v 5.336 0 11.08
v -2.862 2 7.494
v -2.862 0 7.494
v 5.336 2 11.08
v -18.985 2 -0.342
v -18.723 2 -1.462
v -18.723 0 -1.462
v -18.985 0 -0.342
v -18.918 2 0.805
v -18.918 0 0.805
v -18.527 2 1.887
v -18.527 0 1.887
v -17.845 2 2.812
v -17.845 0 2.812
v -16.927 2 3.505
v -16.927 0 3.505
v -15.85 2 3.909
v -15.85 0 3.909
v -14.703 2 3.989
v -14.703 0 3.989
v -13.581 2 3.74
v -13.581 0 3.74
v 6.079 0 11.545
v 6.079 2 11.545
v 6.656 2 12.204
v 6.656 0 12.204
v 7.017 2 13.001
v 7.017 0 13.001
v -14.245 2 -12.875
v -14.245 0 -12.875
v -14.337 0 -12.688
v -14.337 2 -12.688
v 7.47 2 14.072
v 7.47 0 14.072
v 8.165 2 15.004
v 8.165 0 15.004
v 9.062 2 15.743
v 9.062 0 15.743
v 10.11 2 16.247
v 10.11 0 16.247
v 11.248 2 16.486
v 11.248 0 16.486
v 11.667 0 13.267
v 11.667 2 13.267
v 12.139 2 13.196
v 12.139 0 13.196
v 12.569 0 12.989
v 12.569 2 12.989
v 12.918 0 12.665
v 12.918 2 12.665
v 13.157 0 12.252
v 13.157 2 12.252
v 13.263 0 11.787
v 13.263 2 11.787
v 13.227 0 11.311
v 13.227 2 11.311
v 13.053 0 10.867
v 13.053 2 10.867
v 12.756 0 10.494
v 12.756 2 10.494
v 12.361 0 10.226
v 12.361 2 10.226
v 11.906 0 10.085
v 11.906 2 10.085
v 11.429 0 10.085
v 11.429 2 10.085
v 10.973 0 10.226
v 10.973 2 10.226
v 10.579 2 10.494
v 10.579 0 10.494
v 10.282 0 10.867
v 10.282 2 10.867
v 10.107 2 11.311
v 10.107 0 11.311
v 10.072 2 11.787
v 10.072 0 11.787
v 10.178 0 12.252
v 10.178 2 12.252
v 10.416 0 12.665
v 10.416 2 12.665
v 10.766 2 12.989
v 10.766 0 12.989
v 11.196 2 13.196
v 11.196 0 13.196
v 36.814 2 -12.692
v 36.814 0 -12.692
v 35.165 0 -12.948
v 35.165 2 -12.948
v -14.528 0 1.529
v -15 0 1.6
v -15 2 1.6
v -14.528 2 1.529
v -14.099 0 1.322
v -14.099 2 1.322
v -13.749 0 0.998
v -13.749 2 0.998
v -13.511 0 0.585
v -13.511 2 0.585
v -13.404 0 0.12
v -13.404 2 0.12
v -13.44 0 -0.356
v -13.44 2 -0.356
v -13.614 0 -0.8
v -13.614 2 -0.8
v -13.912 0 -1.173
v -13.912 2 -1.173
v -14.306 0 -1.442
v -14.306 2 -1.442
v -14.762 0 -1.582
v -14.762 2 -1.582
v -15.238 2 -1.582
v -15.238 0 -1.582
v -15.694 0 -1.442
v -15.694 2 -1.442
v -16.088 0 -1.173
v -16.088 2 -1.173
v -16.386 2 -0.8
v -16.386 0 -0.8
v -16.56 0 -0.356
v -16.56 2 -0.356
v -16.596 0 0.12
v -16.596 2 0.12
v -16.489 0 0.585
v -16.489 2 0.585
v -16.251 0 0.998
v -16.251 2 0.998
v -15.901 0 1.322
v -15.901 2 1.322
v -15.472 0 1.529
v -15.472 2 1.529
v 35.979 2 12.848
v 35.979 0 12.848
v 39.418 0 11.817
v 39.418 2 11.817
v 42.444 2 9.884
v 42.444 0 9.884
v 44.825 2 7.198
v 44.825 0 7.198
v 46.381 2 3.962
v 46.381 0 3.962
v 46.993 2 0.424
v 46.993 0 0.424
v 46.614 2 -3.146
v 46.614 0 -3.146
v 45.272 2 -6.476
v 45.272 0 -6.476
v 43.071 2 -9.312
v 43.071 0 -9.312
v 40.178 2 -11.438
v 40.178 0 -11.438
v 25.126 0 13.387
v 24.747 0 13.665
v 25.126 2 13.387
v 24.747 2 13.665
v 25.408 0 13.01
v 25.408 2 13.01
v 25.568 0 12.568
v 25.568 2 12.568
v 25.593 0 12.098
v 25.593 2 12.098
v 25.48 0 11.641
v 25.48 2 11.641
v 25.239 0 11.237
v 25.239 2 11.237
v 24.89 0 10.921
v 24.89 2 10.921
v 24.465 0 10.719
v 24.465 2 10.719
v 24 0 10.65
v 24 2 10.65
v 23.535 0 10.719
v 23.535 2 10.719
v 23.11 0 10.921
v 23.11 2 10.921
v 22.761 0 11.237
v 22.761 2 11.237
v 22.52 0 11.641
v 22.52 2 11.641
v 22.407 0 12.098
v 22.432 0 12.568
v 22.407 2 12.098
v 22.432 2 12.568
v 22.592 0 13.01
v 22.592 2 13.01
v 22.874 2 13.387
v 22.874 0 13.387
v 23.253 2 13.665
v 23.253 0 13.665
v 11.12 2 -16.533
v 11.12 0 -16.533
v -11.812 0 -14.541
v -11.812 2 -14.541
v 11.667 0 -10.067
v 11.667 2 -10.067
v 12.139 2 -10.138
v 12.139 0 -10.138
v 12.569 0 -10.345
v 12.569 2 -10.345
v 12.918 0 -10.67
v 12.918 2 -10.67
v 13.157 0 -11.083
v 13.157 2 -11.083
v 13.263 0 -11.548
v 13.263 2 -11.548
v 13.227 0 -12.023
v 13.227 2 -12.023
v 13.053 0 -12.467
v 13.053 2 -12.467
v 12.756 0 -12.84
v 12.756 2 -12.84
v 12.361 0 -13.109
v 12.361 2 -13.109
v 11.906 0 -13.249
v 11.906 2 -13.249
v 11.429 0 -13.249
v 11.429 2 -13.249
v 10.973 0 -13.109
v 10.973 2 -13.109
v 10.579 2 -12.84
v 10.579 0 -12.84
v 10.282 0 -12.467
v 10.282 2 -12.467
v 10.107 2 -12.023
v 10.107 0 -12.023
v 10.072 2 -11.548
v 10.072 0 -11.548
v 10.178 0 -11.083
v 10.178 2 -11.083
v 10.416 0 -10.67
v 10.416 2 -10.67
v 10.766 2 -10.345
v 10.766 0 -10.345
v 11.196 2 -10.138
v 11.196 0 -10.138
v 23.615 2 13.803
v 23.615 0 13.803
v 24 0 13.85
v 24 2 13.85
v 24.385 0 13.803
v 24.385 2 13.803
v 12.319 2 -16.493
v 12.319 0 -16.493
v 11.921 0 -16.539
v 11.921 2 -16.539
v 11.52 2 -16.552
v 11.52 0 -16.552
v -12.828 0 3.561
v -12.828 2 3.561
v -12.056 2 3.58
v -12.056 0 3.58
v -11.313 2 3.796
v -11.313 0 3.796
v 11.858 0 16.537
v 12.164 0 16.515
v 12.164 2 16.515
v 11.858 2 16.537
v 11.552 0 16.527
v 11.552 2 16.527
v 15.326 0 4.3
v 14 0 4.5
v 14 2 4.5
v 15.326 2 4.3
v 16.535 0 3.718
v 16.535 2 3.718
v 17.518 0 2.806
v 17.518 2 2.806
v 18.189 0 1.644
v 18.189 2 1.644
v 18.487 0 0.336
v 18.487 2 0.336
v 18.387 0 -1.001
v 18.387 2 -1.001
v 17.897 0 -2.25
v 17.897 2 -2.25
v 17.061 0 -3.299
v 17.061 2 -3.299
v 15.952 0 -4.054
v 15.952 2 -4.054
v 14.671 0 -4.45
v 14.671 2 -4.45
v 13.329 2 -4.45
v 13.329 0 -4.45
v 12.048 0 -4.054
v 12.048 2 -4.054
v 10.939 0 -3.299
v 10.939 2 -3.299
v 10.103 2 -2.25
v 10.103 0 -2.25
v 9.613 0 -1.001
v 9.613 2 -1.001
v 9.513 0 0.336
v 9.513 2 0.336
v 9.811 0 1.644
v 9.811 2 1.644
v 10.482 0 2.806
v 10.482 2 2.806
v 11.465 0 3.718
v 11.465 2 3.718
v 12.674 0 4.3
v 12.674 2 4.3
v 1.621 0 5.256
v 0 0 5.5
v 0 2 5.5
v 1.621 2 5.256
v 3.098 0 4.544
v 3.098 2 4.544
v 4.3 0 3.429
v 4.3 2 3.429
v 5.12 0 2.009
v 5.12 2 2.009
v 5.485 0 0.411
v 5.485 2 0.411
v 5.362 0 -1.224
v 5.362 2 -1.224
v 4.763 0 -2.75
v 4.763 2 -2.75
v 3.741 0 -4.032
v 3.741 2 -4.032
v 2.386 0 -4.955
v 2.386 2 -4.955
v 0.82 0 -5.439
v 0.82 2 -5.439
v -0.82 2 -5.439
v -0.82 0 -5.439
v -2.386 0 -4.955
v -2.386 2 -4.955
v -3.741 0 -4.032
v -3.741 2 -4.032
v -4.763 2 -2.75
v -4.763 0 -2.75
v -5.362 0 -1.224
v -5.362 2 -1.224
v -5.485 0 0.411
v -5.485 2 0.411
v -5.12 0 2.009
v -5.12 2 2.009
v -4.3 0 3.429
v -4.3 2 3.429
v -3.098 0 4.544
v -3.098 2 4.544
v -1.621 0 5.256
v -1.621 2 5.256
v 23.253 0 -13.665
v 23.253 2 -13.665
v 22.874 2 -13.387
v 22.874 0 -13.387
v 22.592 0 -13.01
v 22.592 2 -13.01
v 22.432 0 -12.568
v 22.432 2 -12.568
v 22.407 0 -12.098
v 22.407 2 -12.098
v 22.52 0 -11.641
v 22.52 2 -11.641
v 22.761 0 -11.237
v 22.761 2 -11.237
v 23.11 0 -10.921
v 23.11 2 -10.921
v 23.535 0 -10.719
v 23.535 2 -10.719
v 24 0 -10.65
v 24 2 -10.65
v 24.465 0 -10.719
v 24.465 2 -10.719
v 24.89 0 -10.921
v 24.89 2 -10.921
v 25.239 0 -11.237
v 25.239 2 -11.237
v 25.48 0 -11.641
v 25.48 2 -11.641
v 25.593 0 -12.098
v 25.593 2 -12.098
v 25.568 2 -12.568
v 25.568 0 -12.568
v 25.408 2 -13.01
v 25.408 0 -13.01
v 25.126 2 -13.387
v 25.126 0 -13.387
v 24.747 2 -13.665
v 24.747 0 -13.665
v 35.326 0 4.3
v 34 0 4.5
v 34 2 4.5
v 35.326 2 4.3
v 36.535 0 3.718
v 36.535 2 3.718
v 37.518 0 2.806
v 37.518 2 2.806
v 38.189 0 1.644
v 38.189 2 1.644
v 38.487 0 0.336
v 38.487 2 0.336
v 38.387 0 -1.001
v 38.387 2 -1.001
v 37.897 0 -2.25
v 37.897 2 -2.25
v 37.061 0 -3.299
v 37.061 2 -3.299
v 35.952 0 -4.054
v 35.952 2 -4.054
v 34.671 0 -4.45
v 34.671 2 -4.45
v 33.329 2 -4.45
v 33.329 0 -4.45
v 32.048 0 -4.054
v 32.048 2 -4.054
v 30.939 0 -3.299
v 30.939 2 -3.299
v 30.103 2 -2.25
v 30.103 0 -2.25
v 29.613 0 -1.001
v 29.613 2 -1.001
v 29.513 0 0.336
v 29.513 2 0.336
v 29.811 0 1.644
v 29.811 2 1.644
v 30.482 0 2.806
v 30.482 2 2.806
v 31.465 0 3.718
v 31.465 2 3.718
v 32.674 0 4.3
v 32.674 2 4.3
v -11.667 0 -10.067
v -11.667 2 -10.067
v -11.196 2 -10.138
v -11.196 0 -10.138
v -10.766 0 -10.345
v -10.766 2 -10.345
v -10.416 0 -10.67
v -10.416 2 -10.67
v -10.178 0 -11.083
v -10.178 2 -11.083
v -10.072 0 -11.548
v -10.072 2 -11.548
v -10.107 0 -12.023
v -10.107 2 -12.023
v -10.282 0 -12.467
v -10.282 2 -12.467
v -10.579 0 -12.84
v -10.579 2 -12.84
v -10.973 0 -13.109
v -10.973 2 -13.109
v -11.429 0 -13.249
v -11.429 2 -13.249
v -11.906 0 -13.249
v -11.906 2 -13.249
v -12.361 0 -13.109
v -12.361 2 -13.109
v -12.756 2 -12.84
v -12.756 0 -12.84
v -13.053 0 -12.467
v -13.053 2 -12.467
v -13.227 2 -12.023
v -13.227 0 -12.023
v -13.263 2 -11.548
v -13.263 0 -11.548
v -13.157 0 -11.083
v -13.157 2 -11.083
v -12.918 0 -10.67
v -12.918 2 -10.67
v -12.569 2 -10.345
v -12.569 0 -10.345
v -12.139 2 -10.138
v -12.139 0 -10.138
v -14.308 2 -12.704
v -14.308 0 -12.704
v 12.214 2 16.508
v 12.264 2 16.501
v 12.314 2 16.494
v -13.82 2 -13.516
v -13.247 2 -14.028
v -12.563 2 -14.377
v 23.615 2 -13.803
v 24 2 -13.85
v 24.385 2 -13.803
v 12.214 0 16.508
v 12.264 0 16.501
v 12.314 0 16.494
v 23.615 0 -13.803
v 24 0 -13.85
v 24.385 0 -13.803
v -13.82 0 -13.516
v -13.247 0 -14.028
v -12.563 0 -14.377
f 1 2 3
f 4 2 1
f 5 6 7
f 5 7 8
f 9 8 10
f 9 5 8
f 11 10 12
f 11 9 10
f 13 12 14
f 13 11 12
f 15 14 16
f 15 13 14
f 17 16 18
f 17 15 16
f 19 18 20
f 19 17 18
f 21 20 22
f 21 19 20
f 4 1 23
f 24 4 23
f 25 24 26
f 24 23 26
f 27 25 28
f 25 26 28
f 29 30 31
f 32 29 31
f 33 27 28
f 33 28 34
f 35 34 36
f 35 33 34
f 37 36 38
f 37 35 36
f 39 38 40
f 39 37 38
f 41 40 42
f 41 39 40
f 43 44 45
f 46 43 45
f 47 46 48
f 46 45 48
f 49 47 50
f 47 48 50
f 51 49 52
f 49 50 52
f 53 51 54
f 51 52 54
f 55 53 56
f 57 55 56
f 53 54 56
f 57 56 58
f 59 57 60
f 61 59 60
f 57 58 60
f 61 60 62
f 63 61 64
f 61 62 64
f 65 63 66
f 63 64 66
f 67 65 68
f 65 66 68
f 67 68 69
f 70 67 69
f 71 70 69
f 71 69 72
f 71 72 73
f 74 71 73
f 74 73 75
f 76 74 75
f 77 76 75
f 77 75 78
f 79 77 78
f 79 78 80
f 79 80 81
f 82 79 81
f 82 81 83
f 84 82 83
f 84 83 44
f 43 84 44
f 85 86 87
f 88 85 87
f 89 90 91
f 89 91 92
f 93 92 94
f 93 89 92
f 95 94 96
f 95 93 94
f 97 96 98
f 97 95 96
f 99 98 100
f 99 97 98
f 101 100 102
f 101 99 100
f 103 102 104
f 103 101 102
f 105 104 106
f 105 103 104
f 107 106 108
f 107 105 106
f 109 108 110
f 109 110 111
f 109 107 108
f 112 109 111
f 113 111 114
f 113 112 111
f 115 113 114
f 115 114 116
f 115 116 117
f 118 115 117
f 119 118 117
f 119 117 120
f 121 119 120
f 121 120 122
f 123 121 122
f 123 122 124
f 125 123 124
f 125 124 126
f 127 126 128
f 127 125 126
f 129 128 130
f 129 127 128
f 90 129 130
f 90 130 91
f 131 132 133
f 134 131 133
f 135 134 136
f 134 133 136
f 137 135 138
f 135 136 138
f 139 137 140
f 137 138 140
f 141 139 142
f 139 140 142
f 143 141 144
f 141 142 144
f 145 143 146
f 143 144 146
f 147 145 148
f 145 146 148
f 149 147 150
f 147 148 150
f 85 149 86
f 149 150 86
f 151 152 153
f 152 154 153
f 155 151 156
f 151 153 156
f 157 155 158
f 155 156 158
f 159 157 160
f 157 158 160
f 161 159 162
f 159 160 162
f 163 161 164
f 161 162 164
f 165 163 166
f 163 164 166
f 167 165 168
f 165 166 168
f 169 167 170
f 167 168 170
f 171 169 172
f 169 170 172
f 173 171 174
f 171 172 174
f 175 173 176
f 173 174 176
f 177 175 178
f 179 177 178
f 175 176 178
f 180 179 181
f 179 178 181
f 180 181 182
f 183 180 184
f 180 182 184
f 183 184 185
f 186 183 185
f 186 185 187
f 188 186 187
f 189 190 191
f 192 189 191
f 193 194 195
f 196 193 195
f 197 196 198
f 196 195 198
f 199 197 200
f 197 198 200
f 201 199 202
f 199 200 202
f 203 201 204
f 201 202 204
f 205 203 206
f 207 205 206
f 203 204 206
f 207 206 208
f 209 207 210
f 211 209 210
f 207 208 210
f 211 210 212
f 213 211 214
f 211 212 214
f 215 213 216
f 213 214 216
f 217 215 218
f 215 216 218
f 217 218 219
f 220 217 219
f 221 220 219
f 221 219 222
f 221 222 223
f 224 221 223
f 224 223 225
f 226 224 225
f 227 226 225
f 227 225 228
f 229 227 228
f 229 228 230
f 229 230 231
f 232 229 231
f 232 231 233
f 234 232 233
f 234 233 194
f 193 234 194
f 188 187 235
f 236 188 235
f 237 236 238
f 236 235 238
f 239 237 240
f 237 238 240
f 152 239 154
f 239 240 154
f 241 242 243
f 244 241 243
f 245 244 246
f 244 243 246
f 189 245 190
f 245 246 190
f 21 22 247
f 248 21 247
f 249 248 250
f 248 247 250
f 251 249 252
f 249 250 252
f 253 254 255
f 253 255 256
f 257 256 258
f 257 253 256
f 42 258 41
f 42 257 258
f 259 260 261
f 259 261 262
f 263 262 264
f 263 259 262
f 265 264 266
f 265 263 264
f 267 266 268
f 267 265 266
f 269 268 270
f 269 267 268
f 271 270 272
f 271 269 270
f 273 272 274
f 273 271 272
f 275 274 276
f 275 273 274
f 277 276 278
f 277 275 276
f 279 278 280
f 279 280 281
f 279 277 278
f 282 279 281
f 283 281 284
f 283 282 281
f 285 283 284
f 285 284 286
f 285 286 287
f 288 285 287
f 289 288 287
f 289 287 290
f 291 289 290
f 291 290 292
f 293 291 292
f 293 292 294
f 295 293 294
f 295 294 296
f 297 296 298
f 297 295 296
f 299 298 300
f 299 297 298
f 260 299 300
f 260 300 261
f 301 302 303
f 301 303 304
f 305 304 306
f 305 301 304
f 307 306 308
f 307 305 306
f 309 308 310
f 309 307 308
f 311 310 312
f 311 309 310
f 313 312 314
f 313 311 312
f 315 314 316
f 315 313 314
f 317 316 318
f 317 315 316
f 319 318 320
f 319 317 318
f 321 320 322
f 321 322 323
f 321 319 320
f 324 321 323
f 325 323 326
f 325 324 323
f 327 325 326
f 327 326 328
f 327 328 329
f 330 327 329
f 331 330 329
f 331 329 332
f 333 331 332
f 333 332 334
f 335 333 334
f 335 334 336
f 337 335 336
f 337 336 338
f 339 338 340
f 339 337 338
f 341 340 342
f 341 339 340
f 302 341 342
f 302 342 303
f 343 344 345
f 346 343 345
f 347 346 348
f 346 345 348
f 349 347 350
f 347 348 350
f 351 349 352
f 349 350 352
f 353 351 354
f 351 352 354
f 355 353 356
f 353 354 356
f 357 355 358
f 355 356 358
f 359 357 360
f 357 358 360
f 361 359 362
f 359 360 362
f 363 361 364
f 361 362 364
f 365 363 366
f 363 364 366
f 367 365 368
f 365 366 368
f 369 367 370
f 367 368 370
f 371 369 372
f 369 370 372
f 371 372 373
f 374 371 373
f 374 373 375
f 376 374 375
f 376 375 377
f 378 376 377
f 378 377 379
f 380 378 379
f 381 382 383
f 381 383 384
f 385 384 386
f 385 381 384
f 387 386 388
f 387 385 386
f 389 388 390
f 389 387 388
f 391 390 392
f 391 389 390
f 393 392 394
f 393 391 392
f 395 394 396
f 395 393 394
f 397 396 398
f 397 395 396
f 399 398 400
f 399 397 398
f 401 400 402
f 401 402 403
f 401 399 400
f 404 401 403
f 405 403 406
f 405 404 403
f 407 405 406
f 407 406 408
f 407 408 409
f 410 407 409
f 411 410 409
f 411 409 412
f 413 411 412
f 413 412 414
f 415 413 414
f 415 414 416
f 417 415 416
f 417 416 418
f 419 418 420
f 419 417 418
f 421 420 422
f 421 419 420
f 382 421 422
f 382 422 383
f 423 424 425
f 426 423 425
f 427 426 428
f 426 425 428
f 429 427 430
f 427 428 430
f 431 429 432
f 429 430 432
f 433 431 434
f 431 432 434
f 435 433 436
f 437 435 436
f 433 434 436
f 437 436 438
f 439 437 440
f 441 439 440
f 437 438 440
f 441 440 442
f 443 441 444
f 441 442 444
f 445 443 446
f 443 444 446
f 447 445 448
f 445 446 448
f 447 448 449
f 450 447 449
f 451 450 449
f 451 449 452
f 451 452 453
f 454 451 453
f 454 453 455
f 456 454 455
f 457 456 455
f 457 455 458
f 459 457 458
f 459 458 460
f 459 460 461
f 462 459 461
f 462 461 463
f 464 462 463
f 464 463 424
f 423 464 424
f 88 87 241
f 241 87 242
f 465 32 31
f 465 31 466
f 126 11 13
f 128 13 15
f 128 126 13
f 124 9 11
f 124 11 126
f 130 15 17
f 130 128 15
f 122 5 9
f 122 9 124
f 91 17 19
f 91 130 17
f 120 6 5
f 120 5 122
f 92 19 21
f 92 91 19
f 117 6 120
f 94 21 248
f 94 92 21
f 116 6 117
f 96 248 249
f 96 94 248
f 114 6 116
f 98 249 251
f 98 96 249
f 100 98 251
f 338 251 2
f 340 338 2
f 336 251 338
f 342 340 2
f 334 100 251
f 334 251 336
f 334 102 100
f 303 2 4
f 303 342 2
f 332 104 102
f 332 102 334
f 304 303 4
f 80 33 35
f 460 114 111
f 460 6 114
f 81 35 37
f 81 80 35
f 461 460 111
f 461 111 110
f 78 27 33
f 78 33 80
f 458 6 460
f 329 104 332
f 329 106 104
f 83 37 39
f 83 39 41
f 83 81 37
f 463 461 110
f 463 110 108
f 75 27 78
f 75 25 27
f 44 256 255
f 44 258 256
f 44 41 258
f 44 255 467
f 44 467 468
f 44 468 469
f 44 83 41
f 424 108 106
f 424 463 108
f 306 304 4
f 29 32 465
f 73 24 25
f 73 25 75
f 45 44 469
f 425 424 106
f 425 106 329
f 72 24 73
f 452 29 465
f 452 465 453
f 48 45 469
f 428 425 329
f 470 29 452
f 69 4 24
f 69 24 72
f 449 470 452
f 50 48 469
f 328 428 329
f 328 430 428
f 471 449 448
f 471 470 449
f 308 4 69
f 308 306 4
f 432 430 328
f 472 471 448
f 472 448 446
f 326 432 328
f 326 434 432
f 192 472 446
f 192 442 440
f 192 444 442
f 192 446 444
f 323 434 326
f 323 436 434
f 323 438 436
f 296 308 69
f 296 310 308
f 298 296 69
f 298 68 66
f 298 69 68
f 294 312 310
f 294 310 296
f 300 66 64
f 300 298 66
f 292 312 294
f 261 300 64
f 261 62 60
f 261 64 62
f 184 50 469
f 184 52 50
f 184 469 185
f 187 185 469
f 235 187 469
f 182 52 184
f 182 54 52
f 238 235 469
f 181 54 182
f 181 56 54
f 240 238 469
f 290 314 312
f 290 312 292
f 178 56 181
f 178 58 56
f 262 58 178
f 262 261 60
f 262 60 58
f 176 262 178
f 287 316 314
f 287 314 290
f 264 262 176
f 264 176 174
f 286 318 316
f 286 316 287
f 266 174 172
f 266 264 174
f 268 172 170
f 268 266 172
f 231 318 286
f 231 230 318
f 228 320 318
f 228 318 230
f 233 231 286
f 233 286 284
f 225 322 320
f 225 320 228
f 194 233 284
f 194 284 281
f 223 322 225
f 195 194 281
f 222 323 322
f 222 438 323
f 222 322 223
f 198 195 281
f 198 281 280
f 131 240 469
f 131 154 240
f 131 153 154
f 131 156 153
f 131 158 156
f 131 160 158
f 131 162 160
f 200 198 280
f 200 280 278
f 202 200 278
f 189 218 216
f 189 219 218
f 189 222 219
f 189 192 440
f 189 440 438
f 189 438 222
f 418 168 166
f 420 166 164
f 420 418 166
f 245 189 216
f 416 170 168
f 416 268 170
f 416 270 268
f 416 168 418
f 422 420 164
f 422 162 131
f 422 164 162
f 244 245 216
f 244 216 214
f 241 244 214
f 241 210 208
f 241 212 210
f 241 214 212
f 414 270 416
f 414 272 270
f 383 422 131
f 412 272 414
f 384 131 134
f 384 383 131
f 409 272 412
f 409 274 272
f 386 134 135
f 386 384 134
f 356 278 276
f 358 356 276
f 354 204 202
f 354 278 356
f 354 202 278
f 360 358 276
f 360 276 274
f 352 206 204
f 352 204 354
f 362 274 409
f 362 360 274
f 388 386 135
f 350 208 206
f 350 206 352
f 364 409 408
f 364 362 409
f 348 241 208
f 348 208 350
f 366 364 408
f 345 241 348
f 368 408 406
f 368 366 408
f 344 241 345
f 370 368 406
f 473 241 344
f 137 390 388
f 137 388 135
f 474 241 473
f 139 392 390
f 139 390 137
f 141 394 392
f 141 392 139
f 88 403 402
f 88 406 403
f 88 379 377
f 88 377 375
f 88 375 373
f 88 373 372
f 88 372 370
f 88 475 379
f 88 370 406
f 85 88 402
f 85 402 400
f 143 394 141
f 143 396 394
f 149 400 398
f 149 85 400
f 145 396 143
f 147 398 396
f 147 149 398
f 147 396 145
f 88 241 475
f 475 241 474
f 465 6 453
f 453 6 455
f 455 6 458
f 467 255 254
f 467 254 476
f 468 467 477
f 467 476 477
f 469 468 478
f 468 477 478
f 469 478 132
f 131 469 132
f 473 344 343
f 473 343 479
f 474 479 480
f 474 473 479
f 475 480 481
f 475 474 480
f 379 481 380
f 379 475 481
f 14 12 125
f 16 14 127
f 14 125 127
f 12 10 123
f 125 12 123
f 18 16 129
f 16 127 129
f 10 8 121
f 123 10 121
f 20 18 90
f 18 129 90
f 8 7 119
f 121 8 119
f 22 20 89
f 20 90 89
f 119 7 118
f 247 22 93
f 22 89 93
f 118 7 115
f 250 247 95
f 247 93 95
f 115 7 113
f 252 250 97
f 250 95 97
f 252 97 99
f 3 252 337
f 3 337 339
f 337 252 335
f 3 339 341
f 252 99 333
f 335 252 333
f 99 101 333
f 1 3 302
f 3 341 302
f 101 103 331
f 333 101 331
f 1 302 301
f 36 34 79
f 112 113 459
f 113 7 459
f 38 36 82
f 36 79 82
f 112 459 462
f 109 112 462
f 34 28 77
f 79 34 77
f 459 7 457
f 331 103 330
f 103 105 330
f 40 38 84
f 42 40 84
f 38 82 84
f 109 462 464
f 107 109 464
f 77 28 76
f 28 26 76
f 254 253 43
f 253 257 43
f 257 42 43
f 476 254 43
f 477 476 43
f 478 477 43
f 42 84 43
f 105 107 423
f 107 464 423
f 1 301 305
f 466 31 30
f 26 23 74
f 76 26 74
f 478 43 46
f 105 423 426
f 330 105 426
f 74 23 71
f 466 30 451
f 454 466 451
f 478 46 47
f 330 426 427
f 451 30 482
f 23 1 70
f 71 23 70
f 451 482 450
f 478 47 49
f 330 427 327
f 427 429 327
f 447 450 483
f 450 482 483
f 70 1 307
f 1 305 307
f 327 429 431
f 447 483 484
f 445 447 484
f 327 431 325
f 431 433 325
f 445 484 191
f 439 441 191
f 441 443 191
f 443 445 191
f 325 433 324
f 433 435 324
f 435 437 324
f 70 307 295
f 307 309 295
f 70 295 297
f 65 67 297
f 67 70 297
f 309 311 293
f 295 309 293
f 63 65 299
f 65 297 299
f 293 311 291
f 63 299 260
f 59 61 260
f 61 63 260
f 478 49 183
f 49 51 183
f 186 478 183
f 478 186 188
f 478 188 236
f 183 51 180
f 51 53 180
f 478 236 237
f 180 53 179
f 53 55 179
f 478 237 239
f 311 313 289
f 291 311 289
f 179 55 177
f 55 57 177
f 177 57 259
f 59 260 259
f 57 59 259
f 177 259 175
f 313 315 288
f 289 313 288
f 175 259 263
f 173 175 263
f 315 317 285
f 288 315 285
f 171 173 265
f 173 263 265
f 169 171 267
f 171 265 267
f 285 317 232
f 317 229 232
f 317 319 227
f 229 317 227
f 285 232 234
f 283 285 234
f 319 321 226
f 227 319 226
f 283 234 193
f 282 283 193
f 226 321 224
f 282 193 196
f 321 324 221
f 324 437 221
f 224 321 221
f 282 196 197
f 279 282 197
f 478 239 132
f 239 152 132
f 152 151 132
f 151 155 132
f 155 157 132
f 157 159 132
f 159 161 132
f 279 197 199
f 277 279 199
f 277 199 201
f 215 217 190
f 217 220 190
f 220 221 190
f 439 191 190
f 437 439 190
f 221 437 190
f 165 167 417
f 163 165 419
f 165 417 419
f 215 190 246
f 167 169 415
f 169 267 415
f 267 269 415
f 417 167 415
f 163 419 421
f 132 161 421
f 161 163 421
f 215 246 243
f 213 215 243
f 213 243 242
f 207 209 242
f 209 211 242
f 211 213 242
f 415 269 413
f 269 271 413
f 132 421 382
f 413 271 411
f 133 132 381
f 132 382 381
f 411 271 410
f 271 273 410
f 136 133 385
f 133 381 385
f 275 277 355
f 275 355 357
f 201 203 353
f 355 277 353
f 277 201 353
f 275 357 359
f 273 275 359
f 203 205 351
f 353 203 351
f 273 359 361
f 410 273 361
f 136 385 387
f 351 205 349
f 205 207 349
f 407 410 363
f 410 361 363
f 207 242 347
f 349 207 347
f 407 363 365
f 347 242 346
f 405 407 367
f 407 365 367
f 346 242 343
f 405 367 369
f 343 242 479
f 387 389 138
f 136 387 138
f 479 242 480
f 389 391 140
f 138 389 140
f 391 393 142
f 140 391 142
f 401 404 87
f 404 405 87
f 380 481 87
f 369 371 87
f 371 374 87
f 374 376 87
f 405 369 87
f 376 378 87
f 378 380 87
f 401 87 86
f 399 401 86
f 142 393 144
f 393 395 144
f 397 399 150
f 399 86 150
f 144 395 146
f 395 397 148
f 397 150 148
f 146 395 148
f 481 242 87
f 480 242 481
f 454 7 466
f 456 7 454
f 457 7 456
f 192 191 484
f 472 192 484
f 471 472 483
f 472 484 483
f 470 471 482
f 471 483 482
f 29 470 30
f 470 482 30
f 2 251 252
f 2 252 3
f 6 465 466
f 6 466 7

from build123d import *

# Parameters (mm, degrees)
SKETCH1_R           = 1.6
SKETCH1_R_2         = 1
SKETCH1_R_3         = 5.5
SKETCH1_R_4         = 4.5
BOSS_EXTRUDE2_DEPTH = 2
BOSS_EXTRUDE3_START = -2
SKETCH2_R           = 1
BOSS_EXTRUDE3_DEPTH = 2
SKETCH3_R           = 1
CUT_EXTRUDE1_DEPTH  = 103
BOSS_EXTRUDE4_START = -2
SKETCH4_R           = 1.6
BOSS_EXTRUDE4_DEPTH = 2
SKETCH5_R           = 1.6
CUT_EXTRUDE2_DEPTH  = 10
SKETCH6_R           = 1.6
CUT_EXTRUDE3_DEPTH  = 10
BOSS_EXTRUDE5_DEPTH = 2
CUT_EXTRUDE4_DEPTH  = 10
SKETCH10_R          = 1.6
SKETCH10_R_2        = 5.5
SKETCH10_R_3        = 4.5
BOSS_EXTRUDE6_DEPTH = 2
FILLET2_START       = -1
FILLET2_DEPTH       = 4
FILLET2_2_DEPTH     = 2


with BuildPart() as part:
    # Sketch1 → Boss-Extrude2 (new body)
    with BuildSketch(Plane(origin=(0, 0, 0), x_dir=(1, 0, 0), z_dir=(0, 1, 0))):
        with BuildLine():
            Line((12.313589515, -16.493996637), (35.979225245, -12.848450001))
            ThreePointArc((35.979225245, -12.848450001), (46.993067566, -0.424494085), (36.813648041, 12.691862933))
            Line((36.813648041, 12.691862933), (35.165189196, 12.947676785))
            Line((35.165189196, 12.947676785), (12.319067304, 16.493021261))
            ThreePointArc((12.319067304, 16.493021261), (11.720527595, 16.549330191), (11.119556233, 16.533395936))
            Line((11.119556233, 16.533395936), (-11.812019178, 14.541098507))
            ThreePointArc((-11.812019178, 14.541098507), (-13.247239988, 14.027709898), (-14.244912332, 12.87528787))
            Line((-14.244912332, 12.87528787), (-19.487592157, 2.204884721))
            ThreePointArc((-19.487592157, 2.204884721), (-19.693653105, -1.723258696), (-16.994761113, -4.584858569))
            Line((-16.994761113, -4.584858569), (9.557587922, -16.137143667))
            ThreePointArc((9.557587922, -16.137143667), (10.910298182, -16.51089082), (12.313589515, -16.493996637))
        make_face()
        with Locations(Location((11.552349036, -11.552285098, 0), (0, 0, 270))):
            Circle(SKETCH1_R, mode=Mode.SUBTRACT)
        with Locations(Location((25, -11, 0), (0, 0, 270))):
            Circle(SKETCH1_R_2, mode=Mode.SUBTRACT)
        with Locations(Location((-15, 0, 0), (0, 0, 270))):
            Circle(SKETCH1_R, mode=Mode.SUBTRACT)
        with Locations(Location((0, 0, 0), (0, 0, 270))):
            Circle(SKETCH1_R_3, mode=Mode.SUBTRACT)
        with Locations(Location((-11.552357038, 11.552357038, 0), (0, 0, 270))):
            Circle(SKETCH1_R, mode=Mode.SUBTRACT)
        with Locations(Location((11.552326466, 11.552160153, 0), (0, 0, 270))):
            Circle(SKETCH1_R, mode=Mode.SUBTRACT)
        with Locations(Location((14, 0, 0), (0, 0, 270))):
            Circle(SKETCH1_R_4, mode=Mode.SUBTRACT)
        with Locations(Location((34, 0, 0), (0, 0, 270))):
            Circle(SKETCH1_R_4, mode=Mode.SUBTRACT)
        with Locations(Location((25, 11, 0), (0, 0, 270))):
            Circle(SKETCH1_R_2, mode=Mode.SUBTRACT)
    extrude(amount=BOSS_EXTRUDE2_DEPTH)

    # Sketch2 → Boss-Extrude3 (add)
    with BuildSketch(Plane(origin=(0, 2, 0), x_dir=(1, 0, 0), z_dir=(0, 1, 0)).offset(BOSS_EXTRUDE3_START)):
        with Locations((25, 11)):
            Circle(SKETCH2_R)
        with Locations((25, -11)):
            Circle(SKETCH2_R)
    extrude(amount=BOSS_EXTRUDE3_DEPTH)

    # Sketch3 → Cut-Extrude1 (cut)
    with BuildSketch(Plane(origin=(0, 2, 0), x_dir=(1, 0, 0), z_dir=(0, 1, 0))):
        with Locations(Location((24, 13, 0), (0, 0, 270))):
            Circle(SKETCH3_R)
        with Locations(Location((24, -13, 0), (0, 0, 270))):
            Circle(SKETCH3_R)
    extrude(amount=-CUT_EXTRUDE1_DEPTH, mode=Mode.SUBTRACT)

    # Sketch4 → Boss-Extrude4 (add)
    with BuildSketch(Plane(origin=(0, 2, 0), x_dir=(1, 0, 0), z_dir=(0, 1, 0)).offset(BOSS_EXTRUDE4_START)):
        with Locations((-11.552357038, 11.552357038)):
            Circle(SKETCH4_R)
        with Locations((11.552326466, 11.552160153)):
            Circle(SKETCH4_R)
        with Locations((11.552349036, -11.552285098)):
            Circle(SKETCH4_R)
    extrude(amount=BOSS_EXTRUDE4_DEPTH)

    # Sketch5 → Cut-Extrude2 (cut)
    with BuildSketch(Plane(origin=(0, 2, 0), x_dir=(1, 0, 0), z_dir=(0, 1, 0))):
        with Locations(Location((-11.66726189, 11.66726189, 0), (0, 0, 270))):
            Circle(SKETCH5_R)
        with Locations(Location((11.66726189, 11.66726189, 0), (0, 0, 270))):
            Circle(SKETCH5_R)
        with Locations(Location((11.66726189, -11.66726189, 0), (0, 0, 270))):
            Circle(SKETCH5_R)
    extrude(amount=-CUT_EXTRUDE2_DEPTH, mode=Mode.SUBTRACT)

    # Sketch6 → Cut-Extrude3 (cut)
    with BuildSketch(Plane(origin=(0, 2, 0), x_dir=(1, 0, 0), z_dir=(0, 1, 0))):
        with Locations((24, 12.25)):
            Circle(SKETCH6_R)
        with Locations((24, -12.25)):
            Circle(SKETCH6_R)
    extrude(amount=-CUT_EXTRUDE3_DEPTH, mode=Mode.SUBTRACT)

    # Sketch7 → Boss-Extrude5 (add)
    with BuildSketch(Plane(origin=(0, 2, 0), x_dir=(1, 0, 0), z_dir=(0, 1, 0))):
        with BuildLine():
            ThreePointArc((24.746843357, 13.665), (24, 14), (23.253156643, 13.665))
            ThreePointArc((23.253156643, 13.665), (24, 13.85), (24.746843357, 13.665))
        make_face()
        with BuildLine():
            ThreePointArc((23.253156643, -13.665), (24, -13.85), (24.746843357, -13.665))
            ThreePointArc((24.746843357, -13.665), (24, -14), (23.253156643, -13.665))
        make_face()
    extrude(amount=-BOSS_EXTRUDE5_DEPTH)

    # Sketch8 → Cut-Extrude4 (cut)
    with BuildSketch(Plane(origin=(0, 2, 0), x_dir=(1, 0, 0), z_dir=(0, 1, 0))):
        with BuildLine():
            Line((-14.308416207, 12.704426351), (-18.723213135, 1.462082061))
            ThreePointArc((-18.723213135, 1.462082061), (-16.986293656, -3.471978904), (-11.852582747, -2.468555172))
            Line((-11.852582747, -2.468555172), (6.930322315, -10.68631196))
            ThreePointArc((6.930322315, -10.68631196), (7.786759617, -14.555611143), (11.247508844, -16.486459611))
            Line((11.247508844, -16.486459611), (11.232461738, -16.659215907))
            Line((11.232461738, -16.659215907), (-9.768707716, -29.444072038))
            Line((-9.768707716, -29.444072038), (-31.03313029, 2.888905984))
            Line((-31.03313029, 2.888905984), (-14.308416207, 12.704426351))
        make_face()
    extrude(amount=-CUT_EXTRUDE4_DEPTH, mode=Mode.SUBTRACT)

    # Sketch10 → Boss-Extrude6 (add)
    # profile 1 of 3: a face of its own
    with BuildSketch(Plane(origin=(0, 2, 0), x_dir=(1, 0, 0), z_dir=(0, 1, 0))):
        with BuildLine():
            Line((6.930322315, -10.68631196), (-2.461130216, -6.577433566))
            Line((-2.461130216, -6.577433566), (-2.861958704, -7.493586677))
            Line((-2.861958704, -7.493586677), (6.830279674, -11.734062656))
            ThreePointArc((6.830279674, -11.734062656), (6.851720384, -11.207458338), (6.930322315, -10.68631196))
        make_face()
    # profile 2 of 3: a face of its own
    with BuildSketch(Plane(origin=(0, 2, 0), x_dir=(1, 0, 0), z_dir=(0, 1, 0))):
        with BuildLine():
            Line((-2.861958704, -7.493586677), (-2.461130216, -6.577433566))
            Line((-2.461130216, -6.577433566), (-11.852582747, -2.468555172))
            ThreePointArc((-11.852582747, -2.468555172), (-12.214781898, -2.870985915), (-12.628009506, -3.220816837))
            Line((-12.628009506, -3.220816837), (-2.861958704, -7.493586677))
        make_face()
    # profile 3 of 3: a face of its own
    with BuildSketch(Plane(origin=(0, 2, 0), x_dir=(1, 0, 0), z_dir=(0, 1, 0))):
        with BuildLine():
            Line((8.035421862, -12.261327493), (6.830279674, -11.734062656))
            ThreePointArc((6.830279674, -11.734062656), (8.124009767, -14.960622436), (11.247508844, -16.486459611))
            Line((11.247508844, -16.486459611), (11.242611849, -16.542682164))
            ThreePointArc((11.242611849, -16.542682164), (11.779409327, -16.5471268), (12.313589515, -16.493996637))
            Line((12.313589515, -16.493996637), (35.979225245, -12.848450001))
            ThreePointArc((35.979225245, -12.848450001), (46.993067566, -0.424494085), (36.813648041, 12.691862933))
            Line((36.813648041, 12.691862933), (12.319067304, 16.493021261))
            ThreePointArc((12.319067304, 16.493021261), (11.720527595, 16.549330191), (11.119556233, 16.533395936))
            Line((11.119556233, 16.533395936), (-11.812019178, 14.541098507))
            ThreePointArc((-11.812019178, 14.541098507), (-13.247239988, 14.027709898), (-14.244912332, 12.87528787))
            Line((-14.244912332, 12.87528787), (-14.337145922, 12.68756525))
            Line((-14.337145922, 12.68756525), (-14.308416207, 12.704426351))
            Line((-14.308416207, 12.704426351), (-18.723213135, 1.462082061))
            ThreePointArc((-18.723213135, 1.462082061), (-17.436972748, -3.171933767), (-12.628009506, -3.220816837))
            Line((-12.628009506, -3.220816837), (-13.301998386, -2.925938239))
            Line((-13.301998386, -2.925938239), (-11.820094843, -1.440006983))
            Line((-11.820094843, -1.440006983), (-1.105948659, -6.127580457))
            Line((-1.105948659, -6.127580457), (8.611687481, -8.831618339))
            Line((8.611687481, -8.831618339), (8.035421862, -12.261327493))
        make_face()
        with Locations(Location((11.66726189, -11.66726189, 0), (0, 0, 270))):
            Circle(SKETCH10_R, mode=Mode.SUBTRACT)
        with Locations(Location((24, -12.25, 0), (0, 0, 270))):
            Circle(SKETCH10_R, mode=Mode.SUBTRACT)
        with Locations(Location((-15, 0, 0), (0, 0, 270))):
            Circle(SKETCH10_R, mode=Mode.SUBTRACT)
        with Locations(Location((0, 0, 0), (0, 0, 270))):
            Circle(SKETCH10_R_2, mode=Mode.SUBTRACT)
        with Locations(Location((-11.66726189, 11.66726189, 0), (0, 0, 270))):
            Circle(SKETCH10_R, mode=Mode.SUBTRACT)
        with Locations(Location((11.66726189, 11.66726189, 0), (0, 0, 270))):
            Circle(SKETCH10_R, mode=Mode.SUBTRACT)
        with Locations(Location((14, 0, 0), (0, 0, 270))):
            Circle(SKETCH10_R_3, mode=Mode.SUBTRACT)
        with Locations(Location((34, 0, 0), (0, 0, 270))):
            Circle(SKETCH10_R_3, mode=Mode.SUBTRACT)
        with Locations(Location((24, 12.25, 0), (0, 0, 270))):
            Circle(SKETCH10_R, mode=Mode.SUBTRACT)
    extrude(amount=-BOSS_EXTRUDE6_DEPTH)

    # Fillet2: read off the stored shape, not the designer's step
    # Fillet2 outline → Fillet2 (cut)
    with BuildSketch(Plane(origin=(0, 0, 0), x_dir=(1, 0, 0), z_dir=(0, 1, 0)).offset(FILLET2_START)):
        with BuildLine():
            ThreePointArc((11.242611849, -16.542682164), (11.704154362, -16.549980081), (12.16440304, -16.514682694))
            ThreePointArc((12.16440304, -16.514682694), (11.70487082, -16.535823924), (11.247508844, -16.486459611))
            Line((11.247508844, -16.486459611), (11.242611849, -16.542682164))
        make_face()
    extrude(amount=FILLET2_DEPTH, mode=Mode.SUBTRACT)

    # Fillet2 2 outline → Fillet2 2 (add)
    with BuildSketch(Plane(origin=(0, 0, 0), x_dir=(1, 0, 0), z_dir=(0, 1, 0))):
        with BuildLine():
            ThreePointArc((-13.580529798, -3.739666341), (-12.441461916, -3.545340418), (-11.313441681, -3.795956765))
            Line((-11.313441681, -3.795956765), (-12.628009506, -3.220816837))
            ThreePointArc((-12.628009506, -3.220816837), (-13.086601256, -3.512677788), (-13.580529798, -3.739666341))
        make_face()
        with BuildLine():
            ThreePointArc((5.336294885, -11.080425553), (6.391396593, -11.853207748), (7.01744839, -13.001463417))
            ThreePointArc((7.01744839, -13.001463417), (6.88172123, -12.373986651), (6.830279674, -11.734062656))
            Line((6.830279674, -11.734062656), (5.336294885, -11.080425553))
        make_face()
    extrude(amount=FILLET2_2_DEPTH)


solid = part.part
